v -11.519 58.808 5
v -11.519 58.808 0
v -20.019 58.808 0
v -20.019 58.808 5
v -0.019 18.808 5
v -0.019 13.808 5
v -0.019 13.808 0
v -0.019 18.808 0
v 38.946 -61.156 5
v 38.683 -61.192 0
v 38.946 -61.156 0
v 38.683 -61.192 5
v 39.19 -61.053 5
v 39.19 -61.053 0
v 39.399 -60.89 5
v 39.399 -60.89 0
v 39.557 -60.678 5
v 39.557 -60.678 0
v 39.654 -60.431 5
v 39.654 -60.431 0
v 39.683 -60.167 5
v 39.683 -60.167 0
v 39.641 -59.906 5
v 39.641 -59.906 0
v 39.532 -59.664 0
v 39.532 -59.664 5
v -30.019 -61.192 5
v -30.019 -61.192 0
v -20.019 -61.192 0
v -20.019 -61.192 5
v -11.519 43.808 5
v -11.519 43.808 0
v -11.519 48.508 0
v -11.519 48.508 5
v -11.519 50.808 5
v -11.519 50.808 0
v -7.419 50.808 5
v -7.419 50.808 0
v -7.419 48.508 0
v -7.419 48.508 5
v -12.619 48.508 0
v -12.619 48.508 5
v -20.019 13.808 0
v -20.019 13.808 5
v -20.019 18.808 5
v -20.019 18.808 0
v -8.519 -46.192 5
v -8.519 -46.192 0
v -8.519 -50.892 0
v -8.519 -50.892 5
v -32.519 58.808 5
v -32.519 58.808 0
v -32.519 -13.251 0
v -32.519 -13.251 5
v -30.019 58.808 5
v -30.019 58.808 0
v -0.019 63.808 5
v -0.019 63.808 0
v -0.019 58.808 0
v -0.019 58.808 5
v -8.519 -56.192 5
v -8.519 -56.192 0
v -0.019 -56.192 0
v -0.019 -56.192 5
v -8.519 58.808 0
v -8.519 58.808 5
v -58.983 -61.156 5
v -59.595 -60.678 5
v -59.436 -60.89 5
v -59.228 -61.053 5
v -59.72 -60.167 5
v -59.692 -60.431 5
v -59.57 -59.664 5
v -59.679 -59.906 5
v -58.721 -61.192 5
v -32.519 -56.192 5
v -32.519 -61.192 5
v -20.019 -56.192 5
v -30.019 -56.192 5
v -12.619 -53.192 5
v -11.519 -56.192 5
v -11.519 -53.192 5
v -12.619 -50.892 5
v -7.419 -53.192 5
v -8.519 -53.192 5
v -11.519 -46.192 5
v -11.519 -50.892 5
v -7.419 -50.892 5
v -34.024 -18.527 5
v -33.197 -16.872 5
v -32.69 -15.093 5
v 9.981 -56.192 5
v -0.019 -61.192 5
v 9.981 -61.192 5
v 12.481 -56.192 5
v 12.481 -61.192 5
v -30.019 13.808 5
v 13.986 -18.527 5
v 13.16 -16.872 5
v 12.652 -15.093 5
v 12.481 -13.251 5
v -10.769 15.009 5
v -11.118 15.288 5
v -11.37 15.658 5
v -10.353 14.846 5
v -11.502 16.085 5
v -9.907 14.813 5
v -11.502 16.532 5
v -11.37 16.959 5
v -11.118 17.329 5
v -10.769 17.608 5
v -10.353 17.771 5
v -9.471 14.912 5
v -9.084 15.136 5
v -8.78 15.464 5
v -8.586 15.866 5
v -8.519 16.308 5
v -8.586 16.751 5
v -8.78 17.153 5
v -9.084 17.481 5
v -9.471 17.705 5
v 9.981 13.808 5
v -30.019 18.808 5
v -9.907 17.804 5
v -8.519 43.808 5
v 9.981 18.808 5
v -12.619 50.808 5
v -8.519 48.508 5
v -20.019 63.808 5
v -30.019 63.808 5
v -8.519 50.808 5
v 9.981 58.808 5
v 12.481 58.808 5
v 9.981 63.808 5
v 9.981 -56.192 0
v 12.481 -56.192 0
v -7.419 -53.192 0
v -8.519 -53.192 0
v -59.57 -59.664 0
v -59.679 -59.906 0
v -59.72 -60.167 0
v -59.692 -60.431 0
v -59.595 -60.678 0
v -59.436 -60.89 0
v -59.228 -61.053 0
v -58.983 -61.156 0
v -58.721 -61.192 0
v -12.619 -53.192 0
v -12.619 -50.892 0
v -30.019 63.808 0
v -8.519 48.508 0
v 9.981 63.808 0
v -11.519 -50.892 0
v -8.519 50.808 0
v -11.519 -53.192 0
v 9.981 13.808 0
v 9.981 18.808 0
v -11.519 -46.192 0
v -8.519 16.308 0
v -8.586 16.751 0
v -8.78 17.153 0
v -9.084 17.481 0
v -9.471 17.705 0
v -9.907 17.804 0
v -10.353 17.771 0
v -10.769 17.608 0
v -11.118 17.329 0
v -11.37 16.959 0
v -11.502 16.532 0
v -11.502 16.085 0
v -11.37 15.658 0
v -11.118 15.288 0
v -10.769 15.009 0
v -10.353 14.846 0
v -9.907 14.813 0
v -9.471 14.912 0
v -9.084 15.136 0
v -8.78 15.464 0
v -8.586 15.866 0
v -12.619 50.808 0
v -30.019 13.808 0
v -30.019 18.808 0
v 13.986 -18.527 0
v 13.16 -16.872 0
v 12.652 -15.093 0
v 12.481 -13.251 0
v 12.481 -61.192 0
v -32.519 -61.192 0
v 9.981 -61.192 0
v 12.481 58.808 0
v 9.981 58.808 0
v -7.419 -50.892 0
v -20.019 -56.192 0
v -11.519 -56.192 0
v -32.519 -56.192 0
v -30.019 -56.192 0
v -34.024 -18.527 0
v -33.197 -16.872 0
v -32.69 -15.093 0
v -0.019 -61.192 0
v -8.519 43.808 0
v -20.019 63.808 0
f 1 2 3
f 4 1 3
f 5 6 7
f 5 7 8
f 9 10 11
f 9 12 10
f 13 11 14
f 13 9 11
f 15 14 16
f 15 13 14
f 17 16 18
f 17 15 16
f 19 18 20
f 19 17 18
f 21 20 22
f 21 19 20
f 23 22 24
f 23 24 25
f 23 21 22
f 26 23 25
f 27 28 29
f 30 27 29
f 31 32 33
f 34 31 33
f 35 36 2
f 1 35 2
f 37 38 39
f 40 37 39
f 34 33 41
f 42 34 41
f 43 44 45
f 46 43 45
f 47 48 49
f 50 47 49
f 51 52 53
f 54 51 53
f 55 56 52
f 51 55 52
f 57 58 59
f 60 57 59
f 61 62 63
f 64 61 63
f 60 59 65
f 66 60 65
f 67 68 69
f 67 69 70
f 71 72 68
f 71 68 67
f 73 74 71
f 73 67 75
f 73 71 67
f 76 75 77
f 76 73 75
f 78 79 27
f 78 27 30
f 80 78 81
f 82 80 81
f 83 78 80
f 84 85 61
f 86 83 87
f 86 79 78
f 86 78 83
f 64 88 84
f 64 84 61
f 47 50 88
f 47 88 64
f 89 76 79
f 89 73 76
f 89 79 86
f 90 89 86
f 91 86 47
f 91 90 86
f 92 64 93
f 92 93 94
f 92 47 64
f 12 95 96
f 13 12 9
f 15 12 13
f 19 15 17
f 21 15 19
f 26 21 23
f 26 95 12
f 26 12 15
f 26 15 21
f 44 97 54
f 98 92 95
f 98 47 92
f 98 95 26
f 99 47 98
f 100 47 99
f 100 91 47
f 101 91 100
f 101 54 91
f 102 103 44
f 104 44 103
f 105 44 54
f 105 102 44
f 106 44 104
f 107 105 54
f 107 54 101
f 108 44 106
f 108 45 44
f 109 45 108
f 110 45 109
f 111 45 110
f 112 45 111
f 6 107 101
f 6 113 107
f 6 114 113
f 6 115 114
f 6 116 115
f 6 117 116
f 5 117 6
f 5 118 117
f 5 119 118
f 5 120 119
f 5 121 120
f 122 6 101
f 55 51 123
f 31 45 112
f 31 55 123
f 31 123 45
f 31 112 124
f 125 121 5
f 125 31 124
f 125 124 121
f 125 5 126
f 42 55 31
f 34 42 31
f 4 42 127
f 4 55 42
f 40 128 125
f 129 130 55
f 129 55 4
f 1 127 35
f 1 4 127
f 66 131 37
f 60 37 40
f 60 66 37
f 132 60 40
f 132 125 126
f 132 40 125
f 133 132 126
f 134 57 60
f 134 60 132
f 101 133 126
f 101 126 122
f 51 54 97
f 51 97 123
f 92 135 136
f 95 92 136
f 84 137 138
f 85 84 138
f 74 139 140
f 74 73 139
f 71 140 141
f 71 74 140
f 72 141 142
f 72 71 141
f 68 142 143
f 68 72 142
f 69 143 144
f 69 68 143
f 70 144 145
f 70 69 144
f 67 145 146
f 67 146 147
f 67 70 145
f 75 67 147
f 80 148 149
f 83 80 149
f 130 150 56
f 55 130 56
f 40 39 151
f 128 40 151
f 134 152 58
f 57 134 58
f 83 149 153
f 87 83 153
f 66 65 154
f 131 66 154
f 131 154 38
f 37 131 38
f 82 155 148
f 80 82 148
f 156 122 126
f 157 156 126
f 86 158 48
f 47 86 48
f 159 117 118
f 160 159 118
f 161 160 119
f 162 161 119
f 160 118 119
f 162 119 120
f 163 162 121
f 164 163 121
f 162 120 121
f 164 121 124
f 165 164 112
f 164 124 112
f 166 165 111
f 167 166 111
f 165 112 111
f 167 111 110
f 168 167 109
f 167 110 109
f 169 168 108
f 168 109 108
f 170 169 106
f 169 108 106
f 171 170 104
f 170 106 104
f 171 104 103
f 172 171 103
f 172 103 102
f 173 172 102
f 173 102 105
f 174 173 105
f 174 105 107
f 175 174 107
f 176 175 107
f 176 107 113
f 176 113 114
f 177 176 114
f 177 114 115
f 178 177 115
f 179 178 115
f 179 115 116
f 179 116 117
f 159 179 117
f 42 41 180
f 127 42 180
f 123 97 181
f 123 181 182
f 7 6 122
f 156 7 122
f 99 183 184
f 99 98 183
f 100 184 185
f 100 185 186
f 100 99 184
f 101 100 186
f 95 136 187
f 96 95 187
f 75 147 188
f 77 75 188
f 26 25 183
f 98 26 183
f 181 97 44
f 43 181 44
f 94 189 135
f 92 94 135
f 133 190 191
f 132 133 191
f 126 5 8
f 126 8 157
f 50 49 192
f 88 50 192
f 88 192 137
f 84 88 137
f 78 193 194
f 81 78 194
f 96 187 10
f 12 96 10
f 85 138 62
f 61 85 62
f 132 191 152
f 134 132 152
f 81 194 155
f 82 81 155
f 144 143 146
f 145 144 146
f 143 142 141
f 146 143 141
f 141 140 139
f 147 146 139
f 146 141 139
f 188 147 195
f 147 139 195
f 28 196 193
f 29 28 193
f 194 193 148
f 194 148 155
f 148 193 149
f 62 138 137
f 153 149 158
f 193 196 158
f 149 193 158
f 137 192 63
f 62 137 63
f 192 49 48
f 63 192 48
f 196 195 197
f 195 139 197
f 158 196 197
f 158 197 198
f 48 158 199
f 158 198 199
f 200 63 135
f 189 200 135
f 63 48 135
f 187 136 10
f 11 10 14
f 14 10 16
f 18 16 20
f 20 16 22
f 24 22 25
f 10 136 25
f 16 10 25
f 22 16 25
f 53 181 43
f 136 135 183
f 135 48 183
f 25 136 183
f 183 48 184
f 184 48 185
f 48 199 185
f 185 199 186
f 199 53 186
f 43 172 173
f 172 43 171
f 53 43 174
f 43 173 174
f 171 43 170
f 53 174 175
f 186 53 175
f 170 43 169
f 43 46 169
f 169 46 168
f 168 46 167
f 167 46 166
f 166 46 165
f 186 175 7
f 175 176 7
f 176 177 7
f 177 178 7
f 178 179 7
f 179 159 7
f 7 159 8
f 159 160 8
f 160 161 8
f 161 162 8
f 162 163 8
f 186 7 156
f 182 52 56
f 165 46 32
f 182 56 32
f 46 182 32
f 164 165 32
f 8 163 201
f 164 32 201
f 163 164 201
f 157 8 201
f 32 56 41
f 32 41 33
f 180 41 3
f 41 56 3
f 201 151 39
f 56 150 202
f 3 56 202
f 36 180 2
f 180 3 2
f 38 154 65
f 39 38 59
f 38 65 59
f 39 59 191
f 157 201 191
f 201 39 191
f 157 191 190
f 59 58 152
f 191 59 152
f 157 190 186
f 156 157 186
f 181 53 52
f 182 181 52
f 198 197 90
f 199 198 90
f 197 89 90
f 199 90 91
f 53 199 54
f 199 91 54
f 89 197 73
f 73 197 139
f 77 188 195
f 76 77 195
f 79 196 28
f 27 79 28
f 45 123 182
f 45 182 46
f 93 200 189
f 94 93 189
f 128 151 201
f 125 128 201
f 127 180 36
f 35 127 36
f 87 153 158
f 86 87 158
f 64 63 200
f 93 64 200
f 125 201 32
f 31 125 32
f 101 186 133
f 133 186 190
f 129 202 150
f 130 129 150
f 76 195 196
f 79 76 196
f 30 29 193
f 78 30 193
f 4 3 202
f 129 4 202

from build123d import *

# Parameters (mm, degrees)
BOSS_EXTRUDE1_DEPTH = 5
SKETCH2_R           = 1.5
SKETCH2_W           = 10
SKETCH2_H           = 5
CUT_EXTRUDE1_DEPTH  = 10
FILLET1_R           = 10
FILLET2_R           = 1


with BuildPart() as part:
    # Sketch1 → Boss-Extrude1 (new body)
    with BuildSketch(Plane.XY):
        Polygon((-32.518889855, -56.191512275), (-30.018889855, -56.191512275), (-30.018889855, -61.191512275), (-20.018889855, -61.191512275), (-20.018889855, -56.191512275), (-11.518889855, -56.191512275), (-11.518889855, -53.191512275), (-12.618889855, -53.191512275), (-12.618889855, -50.891512275), (-11.518889855, -50.891512275), (-11.518889855, -46.191512275), (-8.518889855, -46.191512275), (-8.518889855, -50.891512275), (-7.418889855, -50.891512275), (-7.418889855, -53.191512275), (-8.518889855, -53.191512275), (-8.518889855, -56.191512275), (-0.018889855, -56.191512275), (-0.018889855, -61.191512275), (9.981110145, -61.191512275), (9.981110145, -56.191512275), (12.481110145, -56.191512275), (12.481110145, -61.191512275), (40.481110145, -61.191512275), (12.481110145, -16.103821473), (12.481110145, 58.808487725), (9.981110145, 58.808487725), (9.981110145, 63.808487725), (-0.018889855, 63.808487725), (-0.018889855, 58.808487725), (-8.518889855, 58.808487725), (-8.518889855, 50.808487725), (-7.418889855, 50.808487725), (-7.418889855, 48.508487725), (-8.518889855, 48.508487725), (-8.518889855, 43.808487725), (-11.518889855, 43.808487725), (-11.518889855, 48.508487725), (-12.618889855, 48.508487725), (-12.618889855, 50.808487725), (-11.518889855, 50.808487725), (-11.518889855, 58.808487725), (-20.018889855, 58.808487725), (-20.018889855, 63.808487725), (-30.018889855, 63.808487725), (-30.018889855, 58.808487725), (-32.518889855, 58.808487725), (-32.518889855, -16.103821473), (-60.518889855, -61.191512275), (-32.518889855, -61.191512275), align=None)
    extrude(amount=BOSS_EXTRUDE1_DEPTH)

    # Sketch2 → Cut-Extrude1 (cut)
    with BuildSketch(Plane.XY.offset(5)):
        with Locations((-10.018889855, 16.308487725)):
            Circle(SKETCH2_R)
        with Locations((-25.018889855, 16.308487725)):
            Rectangle(SKETCH2_W, SKETCH2_H)
        with Locations((4.981110145, 16.308487725)):
            Rectangle(SKETCH2_W, SKETCH2_H)
    extrude(amount=-CUT_EXTRUDE1_DEPTH, mode=Mode.SUBTRACT)

    # Fillet1
    fillet1_edges = [part.edges().sort_by_distance(p)[0] for p in [
        (-32.518889855, -16.103821473, 2.5),
        (12.481110145, -16.103821473, 2.5),
    ]]
    fillet(fillet1_edges, radius=FILLET1_R)

    # Fillet2
    fillet2_edges = [part.edges().sort_by_distance(p)[0] for p in [
        (40.481110145, -61.191512275, 2.5),
        (-60.518889855, -61.191512275, 2.5),
    ]]
    fillet(fillet2_edges, radius=FILLET2_R)


solid = part.part
